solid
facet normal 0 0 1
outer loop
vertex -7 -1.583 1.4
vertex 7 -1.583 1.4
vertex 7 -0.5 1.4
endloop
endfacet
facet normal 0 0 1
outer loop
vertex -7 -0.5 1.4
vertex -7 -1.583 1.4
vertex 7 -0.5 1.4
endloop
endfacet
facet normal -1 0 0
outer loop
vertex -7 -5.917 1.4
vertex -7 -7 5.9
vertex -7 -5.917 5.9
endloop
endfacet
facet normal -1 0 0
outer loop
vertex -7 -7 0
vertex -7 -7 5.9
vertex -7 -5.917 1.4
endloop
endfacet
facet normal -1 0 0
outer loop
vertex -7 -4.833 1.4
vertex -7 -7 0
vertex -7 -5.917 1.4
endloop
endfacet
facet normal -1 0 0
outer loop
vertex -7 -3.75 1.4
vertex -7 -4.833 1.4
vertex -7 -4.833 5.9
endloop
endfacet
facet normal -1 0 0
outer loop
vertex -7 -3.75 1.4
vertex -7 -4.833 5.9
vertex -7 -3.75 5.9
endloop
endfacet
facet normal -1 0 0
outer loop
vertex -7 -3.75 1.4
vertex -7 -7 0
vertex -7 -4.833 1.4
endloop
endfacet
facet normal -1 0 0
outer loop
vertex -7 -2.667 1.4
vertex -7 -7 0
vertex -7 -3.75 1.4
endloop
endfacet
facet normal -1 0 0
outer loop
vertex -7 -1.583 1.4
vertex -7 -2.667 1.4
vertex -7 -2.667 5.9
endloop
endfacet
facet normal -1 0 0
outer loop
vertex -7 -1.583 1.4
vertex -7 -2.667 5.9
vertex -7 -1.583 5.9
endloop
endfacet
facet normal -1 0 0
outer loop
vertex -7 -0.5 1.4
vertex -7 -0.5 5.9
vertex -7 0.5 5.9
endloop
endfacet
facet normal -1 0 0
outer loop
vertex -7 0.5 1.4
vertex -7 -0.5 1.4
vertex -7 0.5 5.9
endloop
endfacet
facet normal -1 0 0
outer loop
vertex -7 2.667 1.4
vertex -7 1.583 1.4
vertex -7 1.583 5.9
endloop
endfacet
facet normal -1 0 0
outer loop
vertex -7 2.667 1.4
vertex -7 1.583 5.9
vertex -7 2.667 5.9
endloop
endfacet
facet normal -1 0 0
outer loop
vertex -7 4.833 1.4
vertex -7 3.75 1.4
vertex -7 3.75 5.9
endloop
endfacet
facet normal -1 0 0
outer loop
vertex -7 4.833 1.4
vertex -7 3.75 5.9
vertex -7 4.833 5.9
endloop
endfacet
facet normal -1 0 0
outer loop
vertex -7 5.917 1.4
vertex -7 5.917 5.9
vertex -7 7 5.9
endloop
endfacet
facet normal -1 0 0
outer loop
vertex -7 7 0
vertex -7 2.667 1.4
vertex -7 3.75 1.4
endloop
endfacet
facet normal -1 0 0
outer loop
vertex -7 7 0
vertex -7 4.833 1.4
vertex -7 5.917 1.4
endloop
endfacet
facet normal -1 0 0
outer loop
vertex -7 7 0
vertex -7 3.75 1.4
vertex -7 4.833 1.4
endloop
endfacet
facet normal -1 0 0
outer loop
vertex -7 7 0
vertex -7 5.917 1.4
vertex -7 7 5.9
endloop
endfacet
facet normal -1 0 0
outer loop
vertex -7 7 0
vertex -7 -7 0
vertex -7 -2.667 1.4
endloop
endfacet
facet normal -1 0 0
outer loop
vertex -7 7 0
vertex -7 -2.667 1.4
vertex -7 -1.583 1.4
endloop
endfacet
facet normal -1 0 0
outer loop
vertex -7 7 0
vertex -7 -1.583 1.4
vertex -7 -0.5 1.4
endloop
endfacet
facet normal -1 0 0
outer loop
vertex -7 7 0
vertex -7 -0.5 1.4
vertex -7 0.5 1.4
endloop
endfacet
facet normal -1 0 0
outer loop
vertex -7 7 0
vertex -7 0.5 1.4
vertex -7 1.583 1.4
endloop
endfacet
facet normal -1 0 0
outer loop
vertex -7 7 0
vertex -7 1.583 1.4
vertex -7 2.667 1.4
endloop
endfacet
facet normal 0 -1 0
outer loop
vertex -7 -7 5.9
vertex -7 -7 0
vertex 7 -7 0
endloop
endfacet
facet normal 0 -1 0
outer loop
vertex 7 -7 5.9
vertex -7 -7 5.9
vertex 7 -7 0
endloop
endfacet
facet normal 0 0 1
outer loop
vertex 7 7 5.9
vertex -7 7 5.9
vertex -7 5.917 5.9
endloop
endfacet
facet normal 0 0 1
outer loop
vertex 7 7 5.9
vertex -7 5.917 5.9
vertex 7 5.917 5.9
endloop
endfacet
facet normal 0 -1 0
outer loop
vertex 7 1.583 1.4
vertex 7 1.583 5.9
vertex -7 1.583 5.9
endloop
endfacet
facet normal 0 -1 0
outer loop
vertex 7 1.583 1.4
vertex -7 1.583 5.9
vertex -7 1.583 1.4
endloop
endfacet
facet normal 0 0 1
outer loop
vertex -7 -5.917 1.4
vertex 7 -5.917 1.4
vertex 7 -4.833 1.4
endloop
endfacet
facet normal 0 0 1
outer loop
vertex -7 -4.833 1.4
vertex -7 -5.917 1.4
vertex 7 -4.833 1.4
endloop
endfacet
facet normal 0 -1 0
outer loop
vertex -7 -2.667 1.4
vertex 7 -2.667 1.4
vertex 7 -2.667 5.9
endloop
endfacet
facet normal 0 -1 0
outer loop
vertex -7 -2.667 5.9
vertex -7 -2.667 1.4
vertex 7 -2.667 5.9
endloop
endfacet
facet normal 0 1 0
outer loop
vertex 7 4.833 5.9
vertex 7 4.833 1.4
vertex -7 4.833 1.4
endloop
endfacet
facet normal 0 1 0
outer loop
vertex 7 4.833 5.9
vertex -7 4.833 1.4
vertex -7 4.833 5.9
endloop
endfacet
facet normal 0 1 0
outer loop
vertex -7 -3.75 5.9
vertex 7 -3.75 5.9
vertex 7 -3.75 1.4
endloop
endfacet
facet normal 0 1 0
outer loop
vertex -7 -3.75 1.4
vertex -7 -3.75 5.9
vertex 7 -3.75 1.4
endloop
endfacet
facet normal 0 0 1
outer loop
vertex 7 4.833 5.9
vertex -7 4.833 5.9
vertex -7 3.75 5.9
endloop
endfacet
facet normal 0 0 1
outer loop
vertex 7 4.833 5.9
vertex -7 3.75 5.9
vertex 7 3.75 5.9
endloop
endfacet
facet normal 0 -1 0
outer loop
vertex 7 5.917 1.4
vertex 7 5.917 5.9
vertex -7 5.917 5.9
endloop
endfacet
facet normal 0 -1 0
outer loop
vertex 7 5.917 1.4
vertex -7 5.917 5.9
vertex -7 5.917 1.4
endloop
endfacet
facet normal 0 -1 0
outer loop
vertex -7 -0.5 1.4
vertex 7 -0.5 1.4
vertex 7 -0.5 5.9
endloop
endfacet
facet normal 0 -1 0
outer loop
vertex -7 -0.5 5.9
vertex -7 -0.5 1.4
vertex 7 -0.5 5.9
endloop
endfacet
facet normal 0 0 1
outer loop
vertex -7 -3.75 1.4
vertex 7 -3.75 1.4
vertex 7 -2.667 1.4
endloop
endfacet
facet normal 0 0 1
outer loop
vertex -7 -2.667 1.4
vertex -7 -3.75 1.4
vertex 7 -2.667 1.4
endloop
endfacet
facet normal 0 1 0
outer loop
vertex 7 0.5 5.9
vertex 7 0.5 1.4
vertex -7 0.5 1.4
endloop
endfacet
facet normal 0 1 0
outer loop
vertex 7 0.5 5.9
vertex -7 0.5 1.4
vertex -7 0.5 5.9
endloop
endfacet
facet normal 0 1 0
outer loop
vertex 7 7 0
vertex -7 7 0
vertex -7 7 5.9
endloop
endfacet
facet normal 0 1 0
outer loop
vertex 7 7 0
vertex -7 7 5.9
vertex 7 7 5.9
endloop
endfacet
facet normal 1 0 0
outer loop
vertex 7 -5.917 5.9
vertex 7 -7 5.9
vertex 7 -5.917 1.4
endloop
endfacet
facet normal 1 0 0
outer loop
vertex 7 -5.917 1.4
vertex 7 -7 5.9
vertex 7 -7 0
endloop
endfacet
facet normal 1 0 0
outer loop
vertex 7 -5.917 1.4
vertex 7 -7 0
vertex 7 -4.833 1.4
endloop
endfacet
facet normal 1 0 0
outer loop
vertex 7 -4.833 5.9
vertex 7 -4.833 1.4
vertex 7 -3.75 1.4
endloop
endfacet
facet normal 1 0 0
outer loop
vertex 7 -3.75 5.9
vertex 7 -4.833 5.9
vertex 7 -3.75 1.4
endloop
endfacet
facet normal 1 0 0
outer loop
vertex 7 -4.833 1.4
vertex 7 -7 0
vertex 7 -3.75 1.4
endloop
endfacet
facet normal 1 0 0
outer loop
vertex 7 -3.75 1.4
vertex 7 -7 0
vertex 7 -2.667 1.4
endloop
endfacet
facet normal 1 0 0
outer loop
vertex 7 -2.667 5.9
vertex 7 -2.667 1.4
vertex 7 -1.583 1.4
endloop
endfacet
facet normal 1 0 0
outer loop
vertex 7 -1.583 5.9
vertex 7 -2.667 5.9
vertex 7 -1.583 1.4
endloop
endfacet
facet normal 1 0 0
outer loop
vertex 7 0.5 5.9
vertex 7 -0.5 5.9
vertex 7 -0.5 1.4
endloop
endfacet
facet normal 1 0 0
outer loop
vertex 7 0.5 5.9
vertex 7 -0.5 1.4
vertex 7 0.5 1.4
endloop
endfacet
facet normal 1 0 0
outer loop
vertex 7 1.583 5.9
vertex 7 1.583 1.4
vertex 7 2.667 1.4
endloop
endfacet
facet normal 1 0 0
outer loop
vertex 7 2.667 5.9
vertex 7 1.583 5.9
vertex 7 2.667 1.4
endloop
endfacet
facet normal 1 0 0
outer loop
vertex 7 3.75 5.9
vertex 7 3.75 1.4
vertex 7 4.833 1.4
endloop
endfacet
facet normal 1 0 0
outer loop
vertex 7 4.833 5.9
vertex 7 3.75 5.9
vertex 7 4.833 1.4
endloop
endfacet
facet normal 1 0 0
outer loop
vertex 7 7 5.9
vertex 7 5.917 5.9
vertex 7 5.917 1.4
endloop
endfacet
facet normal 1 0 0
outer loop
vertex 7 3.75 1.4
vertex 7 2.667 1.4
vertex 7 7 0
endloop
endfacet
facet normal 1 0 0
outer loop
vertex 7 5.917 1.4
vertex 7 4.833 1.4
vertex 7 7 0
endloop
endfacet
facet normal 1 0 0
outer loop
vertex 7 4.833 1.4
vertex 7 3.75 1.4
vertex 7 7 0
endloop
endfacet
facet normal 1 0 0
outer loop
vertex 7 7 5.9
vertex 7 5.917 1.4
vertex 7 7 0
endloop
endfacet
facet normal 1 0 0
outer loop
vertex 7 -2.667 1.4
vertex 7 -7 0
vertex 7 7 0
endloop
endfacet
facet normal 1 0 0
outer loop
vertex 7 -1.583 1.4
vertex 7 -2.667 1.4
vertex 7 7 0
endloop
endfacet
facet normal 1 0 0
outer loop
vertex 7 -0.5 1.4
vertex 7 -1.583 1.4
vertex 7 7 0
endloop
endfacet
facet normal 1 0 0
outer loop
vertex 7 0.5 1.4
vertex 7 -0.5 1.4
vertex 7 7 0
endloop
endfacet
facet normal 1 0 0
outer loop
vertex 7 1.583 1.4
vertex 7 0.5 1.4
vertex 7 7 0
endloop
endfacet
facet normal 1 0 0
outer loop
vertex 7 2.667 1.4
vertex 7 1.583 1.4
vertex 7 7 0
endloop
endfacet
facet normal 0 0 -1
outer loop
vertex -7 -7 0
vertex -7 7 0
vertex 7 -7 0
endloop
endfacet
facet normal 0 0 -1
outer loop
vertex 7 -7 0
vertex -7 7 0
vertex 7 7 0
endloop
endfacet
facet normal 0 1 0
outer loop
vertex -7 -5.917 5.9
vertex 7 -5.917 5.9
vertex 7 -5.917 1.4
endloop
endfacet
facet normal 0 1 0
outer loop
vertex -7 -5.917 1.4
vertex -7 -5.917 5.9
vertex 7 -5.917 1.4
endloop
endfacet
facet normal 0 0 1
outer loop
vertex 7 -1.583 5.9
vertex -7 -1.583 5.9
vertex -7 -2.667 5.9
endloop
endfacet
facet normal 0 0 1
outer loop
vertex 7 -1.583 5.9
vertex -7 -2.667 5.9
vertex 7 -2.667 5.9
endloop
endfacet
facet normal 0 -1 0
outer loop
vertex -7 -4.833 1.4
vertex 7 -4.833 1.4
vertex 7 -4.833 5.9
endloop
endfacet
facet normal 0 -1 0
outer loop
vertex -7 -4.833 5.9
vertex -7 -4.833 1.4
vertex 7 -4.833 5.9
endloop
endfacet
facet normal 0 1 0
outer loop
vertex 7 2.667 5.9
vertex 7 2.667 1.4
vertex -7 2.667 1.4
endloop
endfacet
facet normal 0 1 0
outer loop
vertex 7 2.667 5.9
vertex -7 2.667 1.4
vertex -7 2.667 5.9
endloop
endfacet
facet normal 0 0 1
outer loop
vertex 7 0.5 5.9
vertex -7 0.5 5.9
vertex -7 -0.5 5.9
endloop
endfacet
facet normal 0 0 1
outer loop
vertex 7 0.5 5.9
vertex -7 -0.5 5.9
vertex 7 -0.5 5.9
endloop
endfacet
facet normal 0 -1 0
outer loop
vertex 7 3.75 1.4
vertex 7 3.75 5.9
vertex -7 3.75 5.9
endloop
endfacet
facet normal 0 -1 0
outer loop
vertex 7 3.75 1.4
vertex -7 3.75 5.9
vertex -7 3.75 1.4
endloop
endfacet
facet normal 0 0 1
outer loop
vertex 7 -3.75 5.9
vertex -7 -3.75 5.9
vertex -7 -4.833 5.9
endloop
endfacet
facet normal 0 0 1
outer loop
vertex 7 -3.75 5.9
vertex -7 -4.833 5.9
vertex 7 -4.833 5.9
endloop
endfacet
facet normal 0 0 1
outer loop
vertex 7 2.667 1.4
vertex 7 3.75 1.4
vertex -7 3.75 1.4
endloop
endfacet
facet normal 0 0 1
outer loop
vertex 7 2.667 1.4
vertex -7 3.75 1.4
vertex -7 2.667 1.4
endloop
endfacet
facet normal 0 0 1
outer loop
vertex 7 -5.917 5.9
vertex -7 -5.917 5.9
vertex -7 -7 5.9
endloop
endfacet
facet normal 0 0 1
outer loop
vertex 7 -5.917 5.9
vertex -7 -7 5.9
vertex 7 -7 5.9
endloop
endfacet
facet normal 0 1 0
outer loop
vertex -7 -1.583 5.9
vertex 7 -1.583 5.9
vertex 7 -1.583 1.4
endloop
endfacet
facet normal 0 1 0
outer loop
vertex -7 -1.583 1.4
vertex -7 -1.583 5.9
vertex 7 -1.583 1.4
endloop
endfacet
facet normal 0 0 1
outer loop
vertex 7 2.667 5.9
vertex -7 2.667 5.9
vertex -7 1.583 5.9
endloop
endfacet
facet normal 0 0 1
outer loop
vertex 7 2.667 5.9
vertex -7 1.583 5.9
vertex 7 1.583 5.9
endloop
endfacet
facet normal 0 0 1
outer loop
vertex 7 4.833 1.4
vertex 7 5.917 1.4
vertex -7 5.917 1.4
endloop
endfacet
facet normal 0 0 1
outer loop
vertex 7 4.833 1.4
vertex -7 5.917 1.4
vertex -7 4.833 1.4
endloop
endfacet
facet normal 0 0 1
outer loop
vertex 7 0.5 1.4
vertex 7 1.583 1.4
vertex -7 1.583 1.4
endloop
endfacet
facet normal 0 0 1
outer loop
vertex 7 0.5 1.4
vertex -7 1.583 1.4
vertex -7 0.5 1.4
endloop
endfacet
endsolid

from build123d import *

# Parameters (mm, degrees)
SKETCH_W     = 14
SKETCH_H     = 14
PAD_DEPTH    = 5.9
POCKET_DEPTH = 55.319761


with BuildPart() as part:
    # Sketch → Pad (new body)
    with BuildSketch(Plane.XY):
        Rectangle(SKETCH_W, SKETCH_H)
    extrude(amount=PAD_DEPTH)

    # Sketch001 (on Face2 of Pad) → Pocket (cut, through all)
    with BuildSketch(Plane.YZ.offset(7)):
        Polygon((0, 6.9), (7, 6.9), (7, 5.9), (5.916667, 5.9), (5.916667, 1.4), (4.833333, 1.4), (4.833333, 5.9), (3.75, 5.9), (3.75, 1.4), (2.666667, 1.4), (2.666667, 5.9), (1.583333, 5.9), (1.583333, 1.4), (0.5, 1.4), (0.5, 5.9), (0, 5.9), align=None)
    pocket = extrude(amount=-POCKET_DEPTH, mode=Mode.SUBTRACT)

    # Mirrored: Pocket across XZ
    add(pocket.mirror(Plane.XZ), mode=Mode.SUBTRACT)


solid = part.part
